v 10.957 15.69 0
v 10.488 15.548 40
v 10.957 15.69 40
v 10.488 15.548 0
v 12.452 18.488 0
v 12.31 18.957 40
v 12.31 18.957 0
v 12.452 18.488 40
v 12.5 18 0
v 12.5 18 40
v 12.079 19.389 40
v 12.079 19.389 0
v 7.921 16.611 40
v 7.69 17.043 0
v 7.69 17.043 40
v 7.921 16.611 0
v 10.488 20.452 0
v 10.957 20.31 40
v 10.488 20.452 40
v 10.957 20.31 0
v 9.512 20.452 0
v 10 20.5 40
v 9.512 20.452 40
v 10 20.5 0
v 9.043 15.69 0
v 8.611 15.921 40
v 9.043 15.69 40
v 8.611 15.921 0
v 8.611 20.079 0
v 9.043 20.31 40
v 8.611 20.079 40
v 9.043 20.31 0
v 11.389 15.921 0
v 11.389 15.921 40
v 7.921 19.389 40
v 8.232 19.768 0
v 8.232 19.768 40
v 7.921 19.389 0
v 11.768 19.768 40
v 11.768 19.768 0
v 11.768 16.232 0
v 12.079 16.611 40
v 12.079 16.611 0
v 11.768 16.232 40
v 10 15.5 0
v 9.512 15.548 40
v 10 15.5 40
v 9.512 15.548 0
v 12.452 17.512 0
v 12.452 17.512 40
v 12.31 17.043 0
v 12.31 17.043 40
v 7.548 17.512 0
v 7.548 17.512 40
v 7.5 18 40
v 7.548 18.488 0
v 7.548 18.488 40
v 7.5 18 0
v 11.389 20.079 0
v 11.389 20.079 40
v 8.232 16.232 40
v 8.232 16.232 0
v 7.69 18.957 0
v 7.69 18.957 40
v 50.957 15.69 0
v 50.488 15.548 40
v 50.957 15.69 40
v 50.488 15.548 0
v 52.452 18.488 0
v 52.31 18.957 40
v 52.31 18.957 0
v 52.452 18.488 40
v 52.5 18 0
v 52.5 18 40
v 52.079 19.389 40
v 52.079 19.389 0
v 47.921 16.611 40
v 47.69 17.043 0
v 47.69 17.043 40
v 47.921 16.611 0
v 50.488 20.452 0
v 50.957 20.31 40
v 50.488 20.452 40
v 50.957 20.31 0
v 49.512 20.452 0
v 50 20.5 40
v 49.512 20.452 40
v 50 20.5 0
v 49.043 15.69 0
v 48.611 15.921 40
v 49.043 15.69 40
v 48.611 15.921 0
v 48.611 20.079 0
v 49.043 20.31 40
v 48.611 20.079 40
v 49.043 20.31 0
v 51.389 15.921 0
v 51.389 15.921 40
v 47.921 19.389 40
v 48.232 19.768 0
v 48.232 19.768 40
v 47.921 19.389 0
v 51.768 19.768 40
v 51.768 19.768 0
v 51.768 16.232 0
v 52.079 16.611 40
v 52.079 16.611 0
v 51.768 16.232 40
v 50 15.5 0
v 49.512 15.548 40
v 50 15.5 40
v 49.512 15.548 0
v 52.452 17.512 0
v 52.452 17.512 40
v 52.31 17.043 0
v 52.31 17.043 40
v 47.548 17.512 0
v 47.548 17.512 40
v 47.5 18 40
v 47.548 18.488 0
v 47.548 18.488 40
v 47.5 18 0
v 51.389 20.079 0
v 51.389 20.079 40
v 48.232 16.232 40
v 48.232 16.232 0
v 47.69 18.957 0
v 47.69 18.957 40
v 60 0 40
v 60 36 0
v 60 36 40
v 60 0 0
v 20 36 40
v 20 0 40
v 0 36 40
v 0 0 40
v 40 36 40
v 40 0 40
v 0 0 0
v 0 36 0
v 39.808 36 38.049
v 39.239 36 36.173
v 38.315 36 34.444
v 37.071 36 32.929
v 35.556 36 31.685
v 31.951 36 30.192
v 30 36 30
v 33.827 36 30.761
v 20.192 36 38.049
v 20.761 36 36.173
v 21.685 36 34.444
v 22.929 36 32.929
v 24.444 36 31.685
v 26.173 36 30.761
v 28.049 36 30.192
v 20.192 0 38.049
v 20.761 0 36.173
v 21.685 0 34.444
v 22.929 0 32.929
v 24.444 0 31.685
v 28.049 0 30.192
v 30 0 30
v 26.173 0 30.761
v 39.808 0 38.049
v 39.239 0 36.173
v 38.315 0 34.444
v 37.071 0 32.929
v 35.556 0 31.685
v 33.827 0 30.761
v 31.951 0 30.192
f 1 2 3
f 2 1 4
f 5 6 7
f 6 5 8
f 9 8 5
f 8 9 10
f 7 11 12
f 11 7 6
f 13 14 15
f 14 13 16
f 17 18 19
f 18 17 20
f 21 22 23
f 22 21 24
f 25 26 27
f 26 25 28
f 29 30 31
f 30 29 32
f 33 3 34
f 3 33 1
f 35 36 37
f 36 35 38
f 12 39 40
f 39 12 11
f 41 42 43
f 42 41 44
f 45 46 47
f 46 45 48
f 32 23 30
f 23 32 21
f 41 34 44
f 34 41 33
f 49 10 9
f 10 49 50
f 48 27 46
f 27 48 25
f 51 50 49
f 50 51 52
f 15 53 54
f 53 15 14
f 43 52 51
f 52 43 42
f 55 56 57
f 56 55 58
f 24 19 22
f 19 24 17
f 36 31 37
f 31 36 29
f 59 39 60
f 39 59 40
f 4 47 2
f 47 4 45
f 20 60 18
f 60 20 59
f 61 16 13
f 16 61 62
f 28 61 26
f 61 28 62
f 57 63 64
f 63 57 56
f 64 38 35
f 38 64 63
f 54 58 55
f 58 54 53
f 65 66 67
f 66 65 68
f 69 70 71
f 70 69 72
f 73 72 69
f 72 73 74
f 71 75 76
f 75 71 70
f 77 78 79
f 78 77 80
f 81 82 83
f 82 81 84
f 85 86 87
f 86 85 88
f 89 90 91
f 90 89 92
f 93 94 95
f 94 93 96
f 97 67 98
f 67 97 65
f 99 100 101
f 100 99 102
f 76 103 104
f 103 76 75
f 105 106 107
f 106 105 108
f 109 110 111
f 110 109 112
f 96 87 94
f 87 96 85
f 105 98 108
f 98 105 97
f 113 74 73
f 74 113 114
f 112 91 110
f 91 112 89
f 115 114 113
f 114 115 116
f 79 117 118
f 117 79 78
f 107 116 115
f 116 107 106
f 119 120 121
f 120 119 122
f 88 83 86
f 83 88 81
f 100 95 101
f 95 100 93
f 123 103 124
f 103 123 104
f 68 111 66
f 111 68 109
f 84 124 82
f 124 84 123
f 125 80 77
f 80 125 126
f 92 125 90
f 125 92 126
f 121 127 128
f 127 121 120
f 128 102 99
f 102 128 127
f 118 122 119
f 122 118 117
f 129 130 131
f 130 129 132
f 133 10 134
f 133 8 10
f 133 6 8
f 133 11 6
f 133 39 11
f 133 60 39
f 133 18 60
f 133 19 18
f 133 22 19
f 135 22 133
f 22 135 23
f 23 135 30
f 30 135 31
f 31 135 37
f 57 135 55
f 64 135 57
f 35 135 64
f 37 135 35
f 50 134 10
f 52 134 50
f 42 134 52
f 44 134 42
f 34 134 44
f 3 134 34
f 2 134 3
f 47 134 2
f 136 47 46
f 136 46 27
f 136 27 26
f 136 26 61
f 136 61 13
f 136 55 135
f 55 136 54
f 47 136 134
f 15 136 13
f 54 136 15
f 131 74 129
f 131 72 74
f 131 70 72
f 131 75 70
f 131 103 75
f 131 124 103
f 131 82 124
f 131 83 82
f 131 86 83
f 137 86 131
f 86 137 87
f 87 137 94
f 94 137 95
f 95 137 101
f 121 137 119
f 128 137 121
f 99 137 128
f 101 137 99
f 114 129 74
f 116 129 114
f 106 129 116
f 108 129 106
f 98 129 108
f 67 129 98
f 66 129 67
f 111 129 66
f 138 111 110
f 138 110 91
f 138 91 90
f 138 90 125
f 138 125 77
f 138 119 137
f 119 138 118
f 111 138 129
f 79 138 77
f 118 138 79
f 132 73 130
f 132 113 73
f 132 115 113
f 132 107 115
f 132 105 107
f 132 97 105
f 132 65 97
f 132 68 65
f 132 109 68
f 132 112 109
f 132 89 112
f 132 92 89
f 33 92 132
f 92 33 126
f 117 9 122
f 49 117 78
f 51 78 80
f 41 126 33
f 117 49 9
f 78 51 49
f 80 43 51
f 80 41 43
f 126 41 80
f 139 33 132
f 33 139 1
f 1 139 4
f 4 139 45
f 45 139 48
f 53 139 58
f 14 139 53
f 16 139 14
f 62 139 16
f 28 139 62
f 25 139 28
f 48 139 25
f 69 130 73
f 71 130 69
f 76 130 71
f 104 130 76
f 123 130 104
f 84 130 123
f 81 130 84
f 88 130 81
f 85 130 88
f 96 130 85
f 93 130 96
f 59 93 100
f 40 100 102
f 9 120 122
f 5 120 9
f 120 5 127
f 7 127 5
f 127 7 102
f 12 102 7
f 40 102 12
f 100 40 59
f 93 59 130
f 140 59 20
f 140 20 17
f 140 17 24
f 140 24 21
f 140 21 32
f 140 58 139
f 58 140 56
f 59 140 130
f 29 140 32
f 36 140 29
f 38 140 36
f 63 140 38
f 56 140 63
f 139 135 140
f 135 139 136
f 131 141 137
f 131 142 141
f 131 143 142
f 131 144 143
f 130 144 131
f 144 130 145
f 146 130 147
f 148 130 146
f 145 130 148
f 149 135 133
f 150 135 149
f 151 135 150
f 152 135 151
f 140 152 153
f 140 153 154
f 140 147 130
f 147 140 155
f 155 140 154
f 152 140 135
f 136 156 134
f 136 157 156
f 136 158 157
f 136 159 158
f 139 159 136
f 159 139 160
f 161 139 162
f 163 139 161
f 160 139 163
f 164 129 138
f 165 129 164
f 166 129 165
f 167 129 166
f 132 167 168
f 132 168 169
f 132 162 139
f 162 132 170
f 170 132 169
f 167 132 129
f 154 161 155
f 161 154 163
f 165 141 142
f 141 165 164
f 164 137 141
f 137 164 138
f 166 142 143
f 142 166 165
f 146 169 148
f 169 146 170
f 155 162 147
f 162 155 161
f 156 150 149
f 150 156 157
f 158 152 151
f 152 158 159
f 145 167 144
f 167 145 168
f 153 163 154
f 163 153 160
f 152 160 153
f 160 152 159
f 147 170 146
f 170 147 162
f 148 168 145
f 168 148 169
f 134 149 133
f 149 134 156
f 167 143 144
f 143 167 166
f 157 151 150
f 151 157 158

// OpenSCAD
$fn = 32;

// ----------------------------------------------------------------------
// Saddle clamp: plain shaft clamp
// ----------------------------------------------------------------------

// --- parameters (mm) ---
blk_l = 60;               // block length, X
blk_w = 36;               // block width, Y
blk_h = 40;               // block height
clamp_r = 10;             // shaft groove radius
hole_r = 2.5;             // bolt hole radius
hole_m = 10;              // bolt hole margin from the ends
fit_tol = 0.05;           // tolerance for press fits, mm
free_tol = 0.2;           // tolerance for clearance fits, mm

saw_depth = clamp_r + 3;  // saw kerf depth

difference() {
  cube([blk_l, blk_w, blk_h]);
  translate([blk_l / 2, -1, blk_h])
    rotate([-90, 0, 0])
      cylinder(h = blk_w + 2, r = clamp_r);
  for (sx = [0, 1])
    translate([sx ? blk_l - hole_m : hole_m, blk_w / 2, -1])
      cylinder(r = hole_r, h = blk_h + 2);
}
